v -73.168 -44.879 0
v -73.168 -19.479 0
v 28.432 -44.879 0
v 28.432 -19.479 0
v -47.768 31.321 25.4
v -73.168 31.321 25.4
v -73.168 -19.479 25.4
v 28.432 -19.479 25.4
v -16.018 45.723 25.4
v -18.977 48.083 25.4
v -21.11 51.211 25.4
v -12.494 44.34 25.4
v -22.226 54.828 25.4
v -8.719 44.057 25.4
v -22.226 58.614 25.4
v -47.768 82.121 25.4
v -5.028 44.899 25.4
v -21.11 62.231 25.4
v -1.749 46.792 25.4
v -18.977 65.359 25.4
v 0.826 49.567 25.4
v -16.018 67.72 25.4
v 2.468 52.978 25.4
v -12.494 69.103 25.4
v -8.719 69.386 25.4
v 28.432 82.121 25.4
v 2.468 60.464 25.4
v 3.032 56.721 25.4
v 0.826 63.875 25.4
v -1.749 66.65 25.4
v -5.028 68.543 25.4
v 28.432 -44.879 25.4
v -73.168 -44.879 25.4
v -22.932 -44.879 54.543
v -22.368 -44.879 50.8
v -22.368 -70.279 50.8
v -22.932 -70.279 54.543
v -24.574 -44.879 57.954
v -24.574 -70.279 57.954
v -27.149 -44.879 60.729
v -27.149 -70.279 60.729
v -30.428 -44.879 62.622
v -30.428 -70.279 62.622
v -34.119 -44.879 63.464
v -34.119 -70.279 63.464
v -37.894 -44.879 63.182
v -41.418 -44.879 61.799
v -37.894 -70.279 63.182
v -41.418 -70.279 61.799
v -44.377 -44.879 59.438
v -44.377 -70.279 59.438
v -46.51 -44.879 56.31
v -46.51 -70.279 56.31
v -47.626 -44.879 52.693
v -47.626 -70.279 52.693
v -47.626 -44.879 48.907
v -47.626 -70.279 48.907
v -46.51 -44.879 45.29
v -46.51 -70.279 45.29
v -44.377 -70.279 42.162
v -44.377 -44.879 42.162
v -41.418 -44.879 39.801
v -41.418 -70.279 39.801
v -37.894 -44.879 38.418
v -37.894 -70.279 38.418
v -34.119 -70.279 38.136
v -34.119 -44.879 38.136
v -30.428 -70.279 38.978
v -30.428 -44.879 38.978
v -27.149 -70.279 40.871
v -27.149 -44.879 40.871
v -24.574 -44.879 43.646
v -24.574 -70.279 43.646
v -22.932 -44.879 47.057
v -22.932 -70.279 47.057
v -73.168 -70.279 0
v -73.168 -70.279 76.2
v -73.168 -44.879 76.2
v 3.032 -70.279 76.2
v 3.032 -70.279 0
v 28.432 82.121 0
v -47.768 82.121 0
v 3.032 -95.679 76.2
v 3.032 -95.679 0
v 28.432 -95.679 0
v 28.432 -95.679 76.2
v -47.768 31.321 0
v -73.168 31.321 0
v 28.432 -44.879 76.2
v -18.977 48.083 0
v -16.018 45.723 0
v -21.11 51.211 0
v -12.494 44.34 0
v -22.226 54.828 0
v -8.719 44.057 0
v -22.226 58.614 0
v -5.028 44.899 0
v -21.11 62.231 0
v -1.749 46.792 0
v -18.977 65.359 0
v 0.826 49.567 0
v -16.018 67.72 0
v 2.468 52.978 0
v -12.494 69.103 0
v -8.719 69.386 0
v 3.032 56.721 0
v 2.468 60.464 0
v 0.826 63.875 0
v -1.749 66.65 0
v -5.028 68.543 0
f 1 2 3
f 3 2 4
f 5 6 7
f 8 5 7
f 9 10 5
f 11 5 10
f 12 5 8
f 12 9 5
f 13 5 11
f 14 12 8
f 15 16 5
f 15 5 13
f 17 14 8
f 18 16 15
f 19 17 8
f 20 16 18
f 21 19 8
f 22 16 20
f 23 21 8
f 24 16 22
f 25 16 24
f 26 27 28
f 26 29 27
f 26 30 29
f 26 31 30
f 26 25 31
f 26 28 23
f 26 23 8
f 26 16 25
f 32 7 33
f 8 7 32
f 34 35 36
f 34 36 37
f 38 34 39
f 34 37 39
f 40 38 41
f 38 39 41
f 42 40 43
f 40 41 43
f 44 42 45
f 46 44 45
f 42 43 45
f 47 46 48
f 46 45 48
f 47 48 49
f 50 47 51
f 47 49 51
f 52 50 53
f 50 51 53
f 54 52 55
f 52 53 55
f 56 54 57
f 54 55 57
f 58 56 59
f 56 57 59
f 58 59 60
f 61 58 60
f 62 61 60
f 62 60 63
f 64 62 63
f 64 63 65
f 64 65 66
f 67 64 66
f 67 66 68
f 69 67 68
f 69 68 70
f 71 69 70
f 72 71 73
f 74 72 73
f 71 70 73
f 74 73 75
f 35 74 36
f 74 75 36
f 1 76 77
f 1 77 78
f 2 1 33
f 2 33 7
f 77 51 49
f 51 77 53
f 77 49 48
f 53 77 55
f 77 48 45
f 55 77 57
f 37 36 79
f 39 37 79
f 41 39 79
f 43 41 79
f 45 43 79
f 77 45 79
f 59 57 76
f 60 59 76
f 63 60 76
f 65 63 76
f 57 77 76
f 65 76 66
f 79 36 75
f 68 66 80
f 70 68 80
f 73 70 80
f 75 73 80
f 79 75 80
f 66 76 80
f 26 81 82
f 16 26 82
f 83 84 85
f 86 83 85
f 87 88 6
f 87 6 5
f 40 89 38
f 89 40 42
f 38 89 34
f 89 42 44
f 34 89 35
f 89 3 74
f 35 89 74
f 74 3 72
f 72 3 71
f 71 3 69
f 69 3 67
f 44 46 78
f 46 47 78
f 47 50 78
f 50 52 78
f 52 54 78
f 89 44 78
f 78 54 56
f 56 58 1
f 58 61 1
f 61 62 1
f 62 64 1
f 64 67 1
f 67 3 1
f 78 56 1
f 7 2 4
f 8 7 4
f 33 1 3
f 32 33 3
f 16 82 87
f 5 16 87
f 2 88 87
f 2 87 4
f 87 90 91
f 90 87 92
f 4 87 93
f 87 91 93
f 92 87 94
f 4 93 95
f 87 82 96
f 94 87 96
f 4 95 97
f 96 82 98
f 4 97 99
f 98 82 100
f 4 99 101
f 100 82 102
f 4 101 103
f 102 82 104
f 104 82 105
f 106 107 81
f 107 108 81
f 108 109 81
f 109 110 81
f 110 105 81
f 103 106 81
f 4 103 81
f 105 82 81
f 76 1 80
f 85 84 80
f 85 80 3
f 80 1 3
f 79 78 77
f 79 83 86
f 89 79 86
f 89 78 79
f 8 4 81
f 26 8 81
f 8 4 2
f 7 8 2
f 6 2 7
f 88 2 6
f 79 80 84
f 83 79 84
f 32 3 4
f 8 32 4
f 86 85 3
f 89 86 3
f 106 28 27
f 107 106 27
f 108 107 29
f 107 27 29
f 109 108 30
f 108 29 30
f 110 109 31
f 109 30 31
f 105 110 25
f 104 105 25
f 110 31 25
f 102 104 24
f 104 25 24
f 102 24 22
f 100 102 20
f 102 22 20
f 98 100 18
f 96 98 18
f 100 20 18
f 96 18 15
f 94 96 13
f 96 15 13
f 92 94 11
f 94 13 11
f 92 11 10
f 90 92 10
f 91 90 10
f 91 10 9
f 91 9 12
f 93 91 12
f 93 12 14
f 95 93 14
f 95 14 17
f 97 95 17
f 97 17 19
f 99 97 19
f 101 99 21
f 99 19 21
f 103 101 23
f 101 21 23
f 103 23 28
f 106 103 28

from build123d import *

# Parameters (mm, degrees)
F0_W     = 25.4
F0_H     = 50.8
F1_DEPTH = 25.4
F0_H_2   = 25.4
F2_DEPTH = 76.2
F0_W_2   = 76.2
F3_DEPTH = 25.4
F4_R     = 12.7
F5_DEPTH = 25.4
F6_R     = 12.7
F7_DEPTH = 25.4


with BuildPart() as f1:
    # F0 (on Top) → F1 (new body)
    with BuildSketch(Plane.XY):
        Polygon((28.432302, 82.121108), (-47.767698, 82.121108), (-47.767698, 31.321108), (-47.767698, -19.478892), (28.432302, -19.478892), align=None)
        with Locations((-60.467698, 5.921108)):
            Rectangle(F0_W, F0_H)
    extrude(amount=F1_DEPTH)

    # F6 (on face) → F7 (cut)
    with BuildSketch(Plane.XY.offset(25.4)):
        with Locations((-9.667698, 56.721108)):
            Circle(F6_R)
    extrude(amount=-F7_DEPTH, mode=Mode.SUBTRACT)


with BuildPart() as f2:
    # F0 (on Top) → F2 (new body)
    with BuildSketch(Plane.XY):
        Polygon((28.432302, -95.678892), (28.432302, -44.878892), (-47.767698, -44.878892), (-47.767698, -70.278892), (3.032302, -70.278892), (3.032302, -95.678892), align=None)
        with Locations((-60.467698, -57.578892)):
            Rectangle(F0_W, F0_H_2)
    extrude(amount=F2_DEPTH)

    # F4 (on face) → F5 (cut)
    with BuildSketch(Plane.XZ.offset(70.278892)):
        with Locations((-35.067698, 50.8)):
            Circle(F4_R)
    extrude(amount=-F5_DEPTH, mode=Mode.SUBTRACT)


with BuildPart() as f3:
    # F0 (on Top) → F3 (new body)
    with BuildSketch(Plane.XY):
        with Locations((-60.467698, -32.178892)):
            Rectangle(F0_W, F0_H_2)
        with Locations((-9.667698, -32.178892)):
            Rectangle(F0_W_2, F0_H_2)
    extrude(amount=F3_DEPTH)


solid = Compound([f1.part, f2.part, f3.part])
